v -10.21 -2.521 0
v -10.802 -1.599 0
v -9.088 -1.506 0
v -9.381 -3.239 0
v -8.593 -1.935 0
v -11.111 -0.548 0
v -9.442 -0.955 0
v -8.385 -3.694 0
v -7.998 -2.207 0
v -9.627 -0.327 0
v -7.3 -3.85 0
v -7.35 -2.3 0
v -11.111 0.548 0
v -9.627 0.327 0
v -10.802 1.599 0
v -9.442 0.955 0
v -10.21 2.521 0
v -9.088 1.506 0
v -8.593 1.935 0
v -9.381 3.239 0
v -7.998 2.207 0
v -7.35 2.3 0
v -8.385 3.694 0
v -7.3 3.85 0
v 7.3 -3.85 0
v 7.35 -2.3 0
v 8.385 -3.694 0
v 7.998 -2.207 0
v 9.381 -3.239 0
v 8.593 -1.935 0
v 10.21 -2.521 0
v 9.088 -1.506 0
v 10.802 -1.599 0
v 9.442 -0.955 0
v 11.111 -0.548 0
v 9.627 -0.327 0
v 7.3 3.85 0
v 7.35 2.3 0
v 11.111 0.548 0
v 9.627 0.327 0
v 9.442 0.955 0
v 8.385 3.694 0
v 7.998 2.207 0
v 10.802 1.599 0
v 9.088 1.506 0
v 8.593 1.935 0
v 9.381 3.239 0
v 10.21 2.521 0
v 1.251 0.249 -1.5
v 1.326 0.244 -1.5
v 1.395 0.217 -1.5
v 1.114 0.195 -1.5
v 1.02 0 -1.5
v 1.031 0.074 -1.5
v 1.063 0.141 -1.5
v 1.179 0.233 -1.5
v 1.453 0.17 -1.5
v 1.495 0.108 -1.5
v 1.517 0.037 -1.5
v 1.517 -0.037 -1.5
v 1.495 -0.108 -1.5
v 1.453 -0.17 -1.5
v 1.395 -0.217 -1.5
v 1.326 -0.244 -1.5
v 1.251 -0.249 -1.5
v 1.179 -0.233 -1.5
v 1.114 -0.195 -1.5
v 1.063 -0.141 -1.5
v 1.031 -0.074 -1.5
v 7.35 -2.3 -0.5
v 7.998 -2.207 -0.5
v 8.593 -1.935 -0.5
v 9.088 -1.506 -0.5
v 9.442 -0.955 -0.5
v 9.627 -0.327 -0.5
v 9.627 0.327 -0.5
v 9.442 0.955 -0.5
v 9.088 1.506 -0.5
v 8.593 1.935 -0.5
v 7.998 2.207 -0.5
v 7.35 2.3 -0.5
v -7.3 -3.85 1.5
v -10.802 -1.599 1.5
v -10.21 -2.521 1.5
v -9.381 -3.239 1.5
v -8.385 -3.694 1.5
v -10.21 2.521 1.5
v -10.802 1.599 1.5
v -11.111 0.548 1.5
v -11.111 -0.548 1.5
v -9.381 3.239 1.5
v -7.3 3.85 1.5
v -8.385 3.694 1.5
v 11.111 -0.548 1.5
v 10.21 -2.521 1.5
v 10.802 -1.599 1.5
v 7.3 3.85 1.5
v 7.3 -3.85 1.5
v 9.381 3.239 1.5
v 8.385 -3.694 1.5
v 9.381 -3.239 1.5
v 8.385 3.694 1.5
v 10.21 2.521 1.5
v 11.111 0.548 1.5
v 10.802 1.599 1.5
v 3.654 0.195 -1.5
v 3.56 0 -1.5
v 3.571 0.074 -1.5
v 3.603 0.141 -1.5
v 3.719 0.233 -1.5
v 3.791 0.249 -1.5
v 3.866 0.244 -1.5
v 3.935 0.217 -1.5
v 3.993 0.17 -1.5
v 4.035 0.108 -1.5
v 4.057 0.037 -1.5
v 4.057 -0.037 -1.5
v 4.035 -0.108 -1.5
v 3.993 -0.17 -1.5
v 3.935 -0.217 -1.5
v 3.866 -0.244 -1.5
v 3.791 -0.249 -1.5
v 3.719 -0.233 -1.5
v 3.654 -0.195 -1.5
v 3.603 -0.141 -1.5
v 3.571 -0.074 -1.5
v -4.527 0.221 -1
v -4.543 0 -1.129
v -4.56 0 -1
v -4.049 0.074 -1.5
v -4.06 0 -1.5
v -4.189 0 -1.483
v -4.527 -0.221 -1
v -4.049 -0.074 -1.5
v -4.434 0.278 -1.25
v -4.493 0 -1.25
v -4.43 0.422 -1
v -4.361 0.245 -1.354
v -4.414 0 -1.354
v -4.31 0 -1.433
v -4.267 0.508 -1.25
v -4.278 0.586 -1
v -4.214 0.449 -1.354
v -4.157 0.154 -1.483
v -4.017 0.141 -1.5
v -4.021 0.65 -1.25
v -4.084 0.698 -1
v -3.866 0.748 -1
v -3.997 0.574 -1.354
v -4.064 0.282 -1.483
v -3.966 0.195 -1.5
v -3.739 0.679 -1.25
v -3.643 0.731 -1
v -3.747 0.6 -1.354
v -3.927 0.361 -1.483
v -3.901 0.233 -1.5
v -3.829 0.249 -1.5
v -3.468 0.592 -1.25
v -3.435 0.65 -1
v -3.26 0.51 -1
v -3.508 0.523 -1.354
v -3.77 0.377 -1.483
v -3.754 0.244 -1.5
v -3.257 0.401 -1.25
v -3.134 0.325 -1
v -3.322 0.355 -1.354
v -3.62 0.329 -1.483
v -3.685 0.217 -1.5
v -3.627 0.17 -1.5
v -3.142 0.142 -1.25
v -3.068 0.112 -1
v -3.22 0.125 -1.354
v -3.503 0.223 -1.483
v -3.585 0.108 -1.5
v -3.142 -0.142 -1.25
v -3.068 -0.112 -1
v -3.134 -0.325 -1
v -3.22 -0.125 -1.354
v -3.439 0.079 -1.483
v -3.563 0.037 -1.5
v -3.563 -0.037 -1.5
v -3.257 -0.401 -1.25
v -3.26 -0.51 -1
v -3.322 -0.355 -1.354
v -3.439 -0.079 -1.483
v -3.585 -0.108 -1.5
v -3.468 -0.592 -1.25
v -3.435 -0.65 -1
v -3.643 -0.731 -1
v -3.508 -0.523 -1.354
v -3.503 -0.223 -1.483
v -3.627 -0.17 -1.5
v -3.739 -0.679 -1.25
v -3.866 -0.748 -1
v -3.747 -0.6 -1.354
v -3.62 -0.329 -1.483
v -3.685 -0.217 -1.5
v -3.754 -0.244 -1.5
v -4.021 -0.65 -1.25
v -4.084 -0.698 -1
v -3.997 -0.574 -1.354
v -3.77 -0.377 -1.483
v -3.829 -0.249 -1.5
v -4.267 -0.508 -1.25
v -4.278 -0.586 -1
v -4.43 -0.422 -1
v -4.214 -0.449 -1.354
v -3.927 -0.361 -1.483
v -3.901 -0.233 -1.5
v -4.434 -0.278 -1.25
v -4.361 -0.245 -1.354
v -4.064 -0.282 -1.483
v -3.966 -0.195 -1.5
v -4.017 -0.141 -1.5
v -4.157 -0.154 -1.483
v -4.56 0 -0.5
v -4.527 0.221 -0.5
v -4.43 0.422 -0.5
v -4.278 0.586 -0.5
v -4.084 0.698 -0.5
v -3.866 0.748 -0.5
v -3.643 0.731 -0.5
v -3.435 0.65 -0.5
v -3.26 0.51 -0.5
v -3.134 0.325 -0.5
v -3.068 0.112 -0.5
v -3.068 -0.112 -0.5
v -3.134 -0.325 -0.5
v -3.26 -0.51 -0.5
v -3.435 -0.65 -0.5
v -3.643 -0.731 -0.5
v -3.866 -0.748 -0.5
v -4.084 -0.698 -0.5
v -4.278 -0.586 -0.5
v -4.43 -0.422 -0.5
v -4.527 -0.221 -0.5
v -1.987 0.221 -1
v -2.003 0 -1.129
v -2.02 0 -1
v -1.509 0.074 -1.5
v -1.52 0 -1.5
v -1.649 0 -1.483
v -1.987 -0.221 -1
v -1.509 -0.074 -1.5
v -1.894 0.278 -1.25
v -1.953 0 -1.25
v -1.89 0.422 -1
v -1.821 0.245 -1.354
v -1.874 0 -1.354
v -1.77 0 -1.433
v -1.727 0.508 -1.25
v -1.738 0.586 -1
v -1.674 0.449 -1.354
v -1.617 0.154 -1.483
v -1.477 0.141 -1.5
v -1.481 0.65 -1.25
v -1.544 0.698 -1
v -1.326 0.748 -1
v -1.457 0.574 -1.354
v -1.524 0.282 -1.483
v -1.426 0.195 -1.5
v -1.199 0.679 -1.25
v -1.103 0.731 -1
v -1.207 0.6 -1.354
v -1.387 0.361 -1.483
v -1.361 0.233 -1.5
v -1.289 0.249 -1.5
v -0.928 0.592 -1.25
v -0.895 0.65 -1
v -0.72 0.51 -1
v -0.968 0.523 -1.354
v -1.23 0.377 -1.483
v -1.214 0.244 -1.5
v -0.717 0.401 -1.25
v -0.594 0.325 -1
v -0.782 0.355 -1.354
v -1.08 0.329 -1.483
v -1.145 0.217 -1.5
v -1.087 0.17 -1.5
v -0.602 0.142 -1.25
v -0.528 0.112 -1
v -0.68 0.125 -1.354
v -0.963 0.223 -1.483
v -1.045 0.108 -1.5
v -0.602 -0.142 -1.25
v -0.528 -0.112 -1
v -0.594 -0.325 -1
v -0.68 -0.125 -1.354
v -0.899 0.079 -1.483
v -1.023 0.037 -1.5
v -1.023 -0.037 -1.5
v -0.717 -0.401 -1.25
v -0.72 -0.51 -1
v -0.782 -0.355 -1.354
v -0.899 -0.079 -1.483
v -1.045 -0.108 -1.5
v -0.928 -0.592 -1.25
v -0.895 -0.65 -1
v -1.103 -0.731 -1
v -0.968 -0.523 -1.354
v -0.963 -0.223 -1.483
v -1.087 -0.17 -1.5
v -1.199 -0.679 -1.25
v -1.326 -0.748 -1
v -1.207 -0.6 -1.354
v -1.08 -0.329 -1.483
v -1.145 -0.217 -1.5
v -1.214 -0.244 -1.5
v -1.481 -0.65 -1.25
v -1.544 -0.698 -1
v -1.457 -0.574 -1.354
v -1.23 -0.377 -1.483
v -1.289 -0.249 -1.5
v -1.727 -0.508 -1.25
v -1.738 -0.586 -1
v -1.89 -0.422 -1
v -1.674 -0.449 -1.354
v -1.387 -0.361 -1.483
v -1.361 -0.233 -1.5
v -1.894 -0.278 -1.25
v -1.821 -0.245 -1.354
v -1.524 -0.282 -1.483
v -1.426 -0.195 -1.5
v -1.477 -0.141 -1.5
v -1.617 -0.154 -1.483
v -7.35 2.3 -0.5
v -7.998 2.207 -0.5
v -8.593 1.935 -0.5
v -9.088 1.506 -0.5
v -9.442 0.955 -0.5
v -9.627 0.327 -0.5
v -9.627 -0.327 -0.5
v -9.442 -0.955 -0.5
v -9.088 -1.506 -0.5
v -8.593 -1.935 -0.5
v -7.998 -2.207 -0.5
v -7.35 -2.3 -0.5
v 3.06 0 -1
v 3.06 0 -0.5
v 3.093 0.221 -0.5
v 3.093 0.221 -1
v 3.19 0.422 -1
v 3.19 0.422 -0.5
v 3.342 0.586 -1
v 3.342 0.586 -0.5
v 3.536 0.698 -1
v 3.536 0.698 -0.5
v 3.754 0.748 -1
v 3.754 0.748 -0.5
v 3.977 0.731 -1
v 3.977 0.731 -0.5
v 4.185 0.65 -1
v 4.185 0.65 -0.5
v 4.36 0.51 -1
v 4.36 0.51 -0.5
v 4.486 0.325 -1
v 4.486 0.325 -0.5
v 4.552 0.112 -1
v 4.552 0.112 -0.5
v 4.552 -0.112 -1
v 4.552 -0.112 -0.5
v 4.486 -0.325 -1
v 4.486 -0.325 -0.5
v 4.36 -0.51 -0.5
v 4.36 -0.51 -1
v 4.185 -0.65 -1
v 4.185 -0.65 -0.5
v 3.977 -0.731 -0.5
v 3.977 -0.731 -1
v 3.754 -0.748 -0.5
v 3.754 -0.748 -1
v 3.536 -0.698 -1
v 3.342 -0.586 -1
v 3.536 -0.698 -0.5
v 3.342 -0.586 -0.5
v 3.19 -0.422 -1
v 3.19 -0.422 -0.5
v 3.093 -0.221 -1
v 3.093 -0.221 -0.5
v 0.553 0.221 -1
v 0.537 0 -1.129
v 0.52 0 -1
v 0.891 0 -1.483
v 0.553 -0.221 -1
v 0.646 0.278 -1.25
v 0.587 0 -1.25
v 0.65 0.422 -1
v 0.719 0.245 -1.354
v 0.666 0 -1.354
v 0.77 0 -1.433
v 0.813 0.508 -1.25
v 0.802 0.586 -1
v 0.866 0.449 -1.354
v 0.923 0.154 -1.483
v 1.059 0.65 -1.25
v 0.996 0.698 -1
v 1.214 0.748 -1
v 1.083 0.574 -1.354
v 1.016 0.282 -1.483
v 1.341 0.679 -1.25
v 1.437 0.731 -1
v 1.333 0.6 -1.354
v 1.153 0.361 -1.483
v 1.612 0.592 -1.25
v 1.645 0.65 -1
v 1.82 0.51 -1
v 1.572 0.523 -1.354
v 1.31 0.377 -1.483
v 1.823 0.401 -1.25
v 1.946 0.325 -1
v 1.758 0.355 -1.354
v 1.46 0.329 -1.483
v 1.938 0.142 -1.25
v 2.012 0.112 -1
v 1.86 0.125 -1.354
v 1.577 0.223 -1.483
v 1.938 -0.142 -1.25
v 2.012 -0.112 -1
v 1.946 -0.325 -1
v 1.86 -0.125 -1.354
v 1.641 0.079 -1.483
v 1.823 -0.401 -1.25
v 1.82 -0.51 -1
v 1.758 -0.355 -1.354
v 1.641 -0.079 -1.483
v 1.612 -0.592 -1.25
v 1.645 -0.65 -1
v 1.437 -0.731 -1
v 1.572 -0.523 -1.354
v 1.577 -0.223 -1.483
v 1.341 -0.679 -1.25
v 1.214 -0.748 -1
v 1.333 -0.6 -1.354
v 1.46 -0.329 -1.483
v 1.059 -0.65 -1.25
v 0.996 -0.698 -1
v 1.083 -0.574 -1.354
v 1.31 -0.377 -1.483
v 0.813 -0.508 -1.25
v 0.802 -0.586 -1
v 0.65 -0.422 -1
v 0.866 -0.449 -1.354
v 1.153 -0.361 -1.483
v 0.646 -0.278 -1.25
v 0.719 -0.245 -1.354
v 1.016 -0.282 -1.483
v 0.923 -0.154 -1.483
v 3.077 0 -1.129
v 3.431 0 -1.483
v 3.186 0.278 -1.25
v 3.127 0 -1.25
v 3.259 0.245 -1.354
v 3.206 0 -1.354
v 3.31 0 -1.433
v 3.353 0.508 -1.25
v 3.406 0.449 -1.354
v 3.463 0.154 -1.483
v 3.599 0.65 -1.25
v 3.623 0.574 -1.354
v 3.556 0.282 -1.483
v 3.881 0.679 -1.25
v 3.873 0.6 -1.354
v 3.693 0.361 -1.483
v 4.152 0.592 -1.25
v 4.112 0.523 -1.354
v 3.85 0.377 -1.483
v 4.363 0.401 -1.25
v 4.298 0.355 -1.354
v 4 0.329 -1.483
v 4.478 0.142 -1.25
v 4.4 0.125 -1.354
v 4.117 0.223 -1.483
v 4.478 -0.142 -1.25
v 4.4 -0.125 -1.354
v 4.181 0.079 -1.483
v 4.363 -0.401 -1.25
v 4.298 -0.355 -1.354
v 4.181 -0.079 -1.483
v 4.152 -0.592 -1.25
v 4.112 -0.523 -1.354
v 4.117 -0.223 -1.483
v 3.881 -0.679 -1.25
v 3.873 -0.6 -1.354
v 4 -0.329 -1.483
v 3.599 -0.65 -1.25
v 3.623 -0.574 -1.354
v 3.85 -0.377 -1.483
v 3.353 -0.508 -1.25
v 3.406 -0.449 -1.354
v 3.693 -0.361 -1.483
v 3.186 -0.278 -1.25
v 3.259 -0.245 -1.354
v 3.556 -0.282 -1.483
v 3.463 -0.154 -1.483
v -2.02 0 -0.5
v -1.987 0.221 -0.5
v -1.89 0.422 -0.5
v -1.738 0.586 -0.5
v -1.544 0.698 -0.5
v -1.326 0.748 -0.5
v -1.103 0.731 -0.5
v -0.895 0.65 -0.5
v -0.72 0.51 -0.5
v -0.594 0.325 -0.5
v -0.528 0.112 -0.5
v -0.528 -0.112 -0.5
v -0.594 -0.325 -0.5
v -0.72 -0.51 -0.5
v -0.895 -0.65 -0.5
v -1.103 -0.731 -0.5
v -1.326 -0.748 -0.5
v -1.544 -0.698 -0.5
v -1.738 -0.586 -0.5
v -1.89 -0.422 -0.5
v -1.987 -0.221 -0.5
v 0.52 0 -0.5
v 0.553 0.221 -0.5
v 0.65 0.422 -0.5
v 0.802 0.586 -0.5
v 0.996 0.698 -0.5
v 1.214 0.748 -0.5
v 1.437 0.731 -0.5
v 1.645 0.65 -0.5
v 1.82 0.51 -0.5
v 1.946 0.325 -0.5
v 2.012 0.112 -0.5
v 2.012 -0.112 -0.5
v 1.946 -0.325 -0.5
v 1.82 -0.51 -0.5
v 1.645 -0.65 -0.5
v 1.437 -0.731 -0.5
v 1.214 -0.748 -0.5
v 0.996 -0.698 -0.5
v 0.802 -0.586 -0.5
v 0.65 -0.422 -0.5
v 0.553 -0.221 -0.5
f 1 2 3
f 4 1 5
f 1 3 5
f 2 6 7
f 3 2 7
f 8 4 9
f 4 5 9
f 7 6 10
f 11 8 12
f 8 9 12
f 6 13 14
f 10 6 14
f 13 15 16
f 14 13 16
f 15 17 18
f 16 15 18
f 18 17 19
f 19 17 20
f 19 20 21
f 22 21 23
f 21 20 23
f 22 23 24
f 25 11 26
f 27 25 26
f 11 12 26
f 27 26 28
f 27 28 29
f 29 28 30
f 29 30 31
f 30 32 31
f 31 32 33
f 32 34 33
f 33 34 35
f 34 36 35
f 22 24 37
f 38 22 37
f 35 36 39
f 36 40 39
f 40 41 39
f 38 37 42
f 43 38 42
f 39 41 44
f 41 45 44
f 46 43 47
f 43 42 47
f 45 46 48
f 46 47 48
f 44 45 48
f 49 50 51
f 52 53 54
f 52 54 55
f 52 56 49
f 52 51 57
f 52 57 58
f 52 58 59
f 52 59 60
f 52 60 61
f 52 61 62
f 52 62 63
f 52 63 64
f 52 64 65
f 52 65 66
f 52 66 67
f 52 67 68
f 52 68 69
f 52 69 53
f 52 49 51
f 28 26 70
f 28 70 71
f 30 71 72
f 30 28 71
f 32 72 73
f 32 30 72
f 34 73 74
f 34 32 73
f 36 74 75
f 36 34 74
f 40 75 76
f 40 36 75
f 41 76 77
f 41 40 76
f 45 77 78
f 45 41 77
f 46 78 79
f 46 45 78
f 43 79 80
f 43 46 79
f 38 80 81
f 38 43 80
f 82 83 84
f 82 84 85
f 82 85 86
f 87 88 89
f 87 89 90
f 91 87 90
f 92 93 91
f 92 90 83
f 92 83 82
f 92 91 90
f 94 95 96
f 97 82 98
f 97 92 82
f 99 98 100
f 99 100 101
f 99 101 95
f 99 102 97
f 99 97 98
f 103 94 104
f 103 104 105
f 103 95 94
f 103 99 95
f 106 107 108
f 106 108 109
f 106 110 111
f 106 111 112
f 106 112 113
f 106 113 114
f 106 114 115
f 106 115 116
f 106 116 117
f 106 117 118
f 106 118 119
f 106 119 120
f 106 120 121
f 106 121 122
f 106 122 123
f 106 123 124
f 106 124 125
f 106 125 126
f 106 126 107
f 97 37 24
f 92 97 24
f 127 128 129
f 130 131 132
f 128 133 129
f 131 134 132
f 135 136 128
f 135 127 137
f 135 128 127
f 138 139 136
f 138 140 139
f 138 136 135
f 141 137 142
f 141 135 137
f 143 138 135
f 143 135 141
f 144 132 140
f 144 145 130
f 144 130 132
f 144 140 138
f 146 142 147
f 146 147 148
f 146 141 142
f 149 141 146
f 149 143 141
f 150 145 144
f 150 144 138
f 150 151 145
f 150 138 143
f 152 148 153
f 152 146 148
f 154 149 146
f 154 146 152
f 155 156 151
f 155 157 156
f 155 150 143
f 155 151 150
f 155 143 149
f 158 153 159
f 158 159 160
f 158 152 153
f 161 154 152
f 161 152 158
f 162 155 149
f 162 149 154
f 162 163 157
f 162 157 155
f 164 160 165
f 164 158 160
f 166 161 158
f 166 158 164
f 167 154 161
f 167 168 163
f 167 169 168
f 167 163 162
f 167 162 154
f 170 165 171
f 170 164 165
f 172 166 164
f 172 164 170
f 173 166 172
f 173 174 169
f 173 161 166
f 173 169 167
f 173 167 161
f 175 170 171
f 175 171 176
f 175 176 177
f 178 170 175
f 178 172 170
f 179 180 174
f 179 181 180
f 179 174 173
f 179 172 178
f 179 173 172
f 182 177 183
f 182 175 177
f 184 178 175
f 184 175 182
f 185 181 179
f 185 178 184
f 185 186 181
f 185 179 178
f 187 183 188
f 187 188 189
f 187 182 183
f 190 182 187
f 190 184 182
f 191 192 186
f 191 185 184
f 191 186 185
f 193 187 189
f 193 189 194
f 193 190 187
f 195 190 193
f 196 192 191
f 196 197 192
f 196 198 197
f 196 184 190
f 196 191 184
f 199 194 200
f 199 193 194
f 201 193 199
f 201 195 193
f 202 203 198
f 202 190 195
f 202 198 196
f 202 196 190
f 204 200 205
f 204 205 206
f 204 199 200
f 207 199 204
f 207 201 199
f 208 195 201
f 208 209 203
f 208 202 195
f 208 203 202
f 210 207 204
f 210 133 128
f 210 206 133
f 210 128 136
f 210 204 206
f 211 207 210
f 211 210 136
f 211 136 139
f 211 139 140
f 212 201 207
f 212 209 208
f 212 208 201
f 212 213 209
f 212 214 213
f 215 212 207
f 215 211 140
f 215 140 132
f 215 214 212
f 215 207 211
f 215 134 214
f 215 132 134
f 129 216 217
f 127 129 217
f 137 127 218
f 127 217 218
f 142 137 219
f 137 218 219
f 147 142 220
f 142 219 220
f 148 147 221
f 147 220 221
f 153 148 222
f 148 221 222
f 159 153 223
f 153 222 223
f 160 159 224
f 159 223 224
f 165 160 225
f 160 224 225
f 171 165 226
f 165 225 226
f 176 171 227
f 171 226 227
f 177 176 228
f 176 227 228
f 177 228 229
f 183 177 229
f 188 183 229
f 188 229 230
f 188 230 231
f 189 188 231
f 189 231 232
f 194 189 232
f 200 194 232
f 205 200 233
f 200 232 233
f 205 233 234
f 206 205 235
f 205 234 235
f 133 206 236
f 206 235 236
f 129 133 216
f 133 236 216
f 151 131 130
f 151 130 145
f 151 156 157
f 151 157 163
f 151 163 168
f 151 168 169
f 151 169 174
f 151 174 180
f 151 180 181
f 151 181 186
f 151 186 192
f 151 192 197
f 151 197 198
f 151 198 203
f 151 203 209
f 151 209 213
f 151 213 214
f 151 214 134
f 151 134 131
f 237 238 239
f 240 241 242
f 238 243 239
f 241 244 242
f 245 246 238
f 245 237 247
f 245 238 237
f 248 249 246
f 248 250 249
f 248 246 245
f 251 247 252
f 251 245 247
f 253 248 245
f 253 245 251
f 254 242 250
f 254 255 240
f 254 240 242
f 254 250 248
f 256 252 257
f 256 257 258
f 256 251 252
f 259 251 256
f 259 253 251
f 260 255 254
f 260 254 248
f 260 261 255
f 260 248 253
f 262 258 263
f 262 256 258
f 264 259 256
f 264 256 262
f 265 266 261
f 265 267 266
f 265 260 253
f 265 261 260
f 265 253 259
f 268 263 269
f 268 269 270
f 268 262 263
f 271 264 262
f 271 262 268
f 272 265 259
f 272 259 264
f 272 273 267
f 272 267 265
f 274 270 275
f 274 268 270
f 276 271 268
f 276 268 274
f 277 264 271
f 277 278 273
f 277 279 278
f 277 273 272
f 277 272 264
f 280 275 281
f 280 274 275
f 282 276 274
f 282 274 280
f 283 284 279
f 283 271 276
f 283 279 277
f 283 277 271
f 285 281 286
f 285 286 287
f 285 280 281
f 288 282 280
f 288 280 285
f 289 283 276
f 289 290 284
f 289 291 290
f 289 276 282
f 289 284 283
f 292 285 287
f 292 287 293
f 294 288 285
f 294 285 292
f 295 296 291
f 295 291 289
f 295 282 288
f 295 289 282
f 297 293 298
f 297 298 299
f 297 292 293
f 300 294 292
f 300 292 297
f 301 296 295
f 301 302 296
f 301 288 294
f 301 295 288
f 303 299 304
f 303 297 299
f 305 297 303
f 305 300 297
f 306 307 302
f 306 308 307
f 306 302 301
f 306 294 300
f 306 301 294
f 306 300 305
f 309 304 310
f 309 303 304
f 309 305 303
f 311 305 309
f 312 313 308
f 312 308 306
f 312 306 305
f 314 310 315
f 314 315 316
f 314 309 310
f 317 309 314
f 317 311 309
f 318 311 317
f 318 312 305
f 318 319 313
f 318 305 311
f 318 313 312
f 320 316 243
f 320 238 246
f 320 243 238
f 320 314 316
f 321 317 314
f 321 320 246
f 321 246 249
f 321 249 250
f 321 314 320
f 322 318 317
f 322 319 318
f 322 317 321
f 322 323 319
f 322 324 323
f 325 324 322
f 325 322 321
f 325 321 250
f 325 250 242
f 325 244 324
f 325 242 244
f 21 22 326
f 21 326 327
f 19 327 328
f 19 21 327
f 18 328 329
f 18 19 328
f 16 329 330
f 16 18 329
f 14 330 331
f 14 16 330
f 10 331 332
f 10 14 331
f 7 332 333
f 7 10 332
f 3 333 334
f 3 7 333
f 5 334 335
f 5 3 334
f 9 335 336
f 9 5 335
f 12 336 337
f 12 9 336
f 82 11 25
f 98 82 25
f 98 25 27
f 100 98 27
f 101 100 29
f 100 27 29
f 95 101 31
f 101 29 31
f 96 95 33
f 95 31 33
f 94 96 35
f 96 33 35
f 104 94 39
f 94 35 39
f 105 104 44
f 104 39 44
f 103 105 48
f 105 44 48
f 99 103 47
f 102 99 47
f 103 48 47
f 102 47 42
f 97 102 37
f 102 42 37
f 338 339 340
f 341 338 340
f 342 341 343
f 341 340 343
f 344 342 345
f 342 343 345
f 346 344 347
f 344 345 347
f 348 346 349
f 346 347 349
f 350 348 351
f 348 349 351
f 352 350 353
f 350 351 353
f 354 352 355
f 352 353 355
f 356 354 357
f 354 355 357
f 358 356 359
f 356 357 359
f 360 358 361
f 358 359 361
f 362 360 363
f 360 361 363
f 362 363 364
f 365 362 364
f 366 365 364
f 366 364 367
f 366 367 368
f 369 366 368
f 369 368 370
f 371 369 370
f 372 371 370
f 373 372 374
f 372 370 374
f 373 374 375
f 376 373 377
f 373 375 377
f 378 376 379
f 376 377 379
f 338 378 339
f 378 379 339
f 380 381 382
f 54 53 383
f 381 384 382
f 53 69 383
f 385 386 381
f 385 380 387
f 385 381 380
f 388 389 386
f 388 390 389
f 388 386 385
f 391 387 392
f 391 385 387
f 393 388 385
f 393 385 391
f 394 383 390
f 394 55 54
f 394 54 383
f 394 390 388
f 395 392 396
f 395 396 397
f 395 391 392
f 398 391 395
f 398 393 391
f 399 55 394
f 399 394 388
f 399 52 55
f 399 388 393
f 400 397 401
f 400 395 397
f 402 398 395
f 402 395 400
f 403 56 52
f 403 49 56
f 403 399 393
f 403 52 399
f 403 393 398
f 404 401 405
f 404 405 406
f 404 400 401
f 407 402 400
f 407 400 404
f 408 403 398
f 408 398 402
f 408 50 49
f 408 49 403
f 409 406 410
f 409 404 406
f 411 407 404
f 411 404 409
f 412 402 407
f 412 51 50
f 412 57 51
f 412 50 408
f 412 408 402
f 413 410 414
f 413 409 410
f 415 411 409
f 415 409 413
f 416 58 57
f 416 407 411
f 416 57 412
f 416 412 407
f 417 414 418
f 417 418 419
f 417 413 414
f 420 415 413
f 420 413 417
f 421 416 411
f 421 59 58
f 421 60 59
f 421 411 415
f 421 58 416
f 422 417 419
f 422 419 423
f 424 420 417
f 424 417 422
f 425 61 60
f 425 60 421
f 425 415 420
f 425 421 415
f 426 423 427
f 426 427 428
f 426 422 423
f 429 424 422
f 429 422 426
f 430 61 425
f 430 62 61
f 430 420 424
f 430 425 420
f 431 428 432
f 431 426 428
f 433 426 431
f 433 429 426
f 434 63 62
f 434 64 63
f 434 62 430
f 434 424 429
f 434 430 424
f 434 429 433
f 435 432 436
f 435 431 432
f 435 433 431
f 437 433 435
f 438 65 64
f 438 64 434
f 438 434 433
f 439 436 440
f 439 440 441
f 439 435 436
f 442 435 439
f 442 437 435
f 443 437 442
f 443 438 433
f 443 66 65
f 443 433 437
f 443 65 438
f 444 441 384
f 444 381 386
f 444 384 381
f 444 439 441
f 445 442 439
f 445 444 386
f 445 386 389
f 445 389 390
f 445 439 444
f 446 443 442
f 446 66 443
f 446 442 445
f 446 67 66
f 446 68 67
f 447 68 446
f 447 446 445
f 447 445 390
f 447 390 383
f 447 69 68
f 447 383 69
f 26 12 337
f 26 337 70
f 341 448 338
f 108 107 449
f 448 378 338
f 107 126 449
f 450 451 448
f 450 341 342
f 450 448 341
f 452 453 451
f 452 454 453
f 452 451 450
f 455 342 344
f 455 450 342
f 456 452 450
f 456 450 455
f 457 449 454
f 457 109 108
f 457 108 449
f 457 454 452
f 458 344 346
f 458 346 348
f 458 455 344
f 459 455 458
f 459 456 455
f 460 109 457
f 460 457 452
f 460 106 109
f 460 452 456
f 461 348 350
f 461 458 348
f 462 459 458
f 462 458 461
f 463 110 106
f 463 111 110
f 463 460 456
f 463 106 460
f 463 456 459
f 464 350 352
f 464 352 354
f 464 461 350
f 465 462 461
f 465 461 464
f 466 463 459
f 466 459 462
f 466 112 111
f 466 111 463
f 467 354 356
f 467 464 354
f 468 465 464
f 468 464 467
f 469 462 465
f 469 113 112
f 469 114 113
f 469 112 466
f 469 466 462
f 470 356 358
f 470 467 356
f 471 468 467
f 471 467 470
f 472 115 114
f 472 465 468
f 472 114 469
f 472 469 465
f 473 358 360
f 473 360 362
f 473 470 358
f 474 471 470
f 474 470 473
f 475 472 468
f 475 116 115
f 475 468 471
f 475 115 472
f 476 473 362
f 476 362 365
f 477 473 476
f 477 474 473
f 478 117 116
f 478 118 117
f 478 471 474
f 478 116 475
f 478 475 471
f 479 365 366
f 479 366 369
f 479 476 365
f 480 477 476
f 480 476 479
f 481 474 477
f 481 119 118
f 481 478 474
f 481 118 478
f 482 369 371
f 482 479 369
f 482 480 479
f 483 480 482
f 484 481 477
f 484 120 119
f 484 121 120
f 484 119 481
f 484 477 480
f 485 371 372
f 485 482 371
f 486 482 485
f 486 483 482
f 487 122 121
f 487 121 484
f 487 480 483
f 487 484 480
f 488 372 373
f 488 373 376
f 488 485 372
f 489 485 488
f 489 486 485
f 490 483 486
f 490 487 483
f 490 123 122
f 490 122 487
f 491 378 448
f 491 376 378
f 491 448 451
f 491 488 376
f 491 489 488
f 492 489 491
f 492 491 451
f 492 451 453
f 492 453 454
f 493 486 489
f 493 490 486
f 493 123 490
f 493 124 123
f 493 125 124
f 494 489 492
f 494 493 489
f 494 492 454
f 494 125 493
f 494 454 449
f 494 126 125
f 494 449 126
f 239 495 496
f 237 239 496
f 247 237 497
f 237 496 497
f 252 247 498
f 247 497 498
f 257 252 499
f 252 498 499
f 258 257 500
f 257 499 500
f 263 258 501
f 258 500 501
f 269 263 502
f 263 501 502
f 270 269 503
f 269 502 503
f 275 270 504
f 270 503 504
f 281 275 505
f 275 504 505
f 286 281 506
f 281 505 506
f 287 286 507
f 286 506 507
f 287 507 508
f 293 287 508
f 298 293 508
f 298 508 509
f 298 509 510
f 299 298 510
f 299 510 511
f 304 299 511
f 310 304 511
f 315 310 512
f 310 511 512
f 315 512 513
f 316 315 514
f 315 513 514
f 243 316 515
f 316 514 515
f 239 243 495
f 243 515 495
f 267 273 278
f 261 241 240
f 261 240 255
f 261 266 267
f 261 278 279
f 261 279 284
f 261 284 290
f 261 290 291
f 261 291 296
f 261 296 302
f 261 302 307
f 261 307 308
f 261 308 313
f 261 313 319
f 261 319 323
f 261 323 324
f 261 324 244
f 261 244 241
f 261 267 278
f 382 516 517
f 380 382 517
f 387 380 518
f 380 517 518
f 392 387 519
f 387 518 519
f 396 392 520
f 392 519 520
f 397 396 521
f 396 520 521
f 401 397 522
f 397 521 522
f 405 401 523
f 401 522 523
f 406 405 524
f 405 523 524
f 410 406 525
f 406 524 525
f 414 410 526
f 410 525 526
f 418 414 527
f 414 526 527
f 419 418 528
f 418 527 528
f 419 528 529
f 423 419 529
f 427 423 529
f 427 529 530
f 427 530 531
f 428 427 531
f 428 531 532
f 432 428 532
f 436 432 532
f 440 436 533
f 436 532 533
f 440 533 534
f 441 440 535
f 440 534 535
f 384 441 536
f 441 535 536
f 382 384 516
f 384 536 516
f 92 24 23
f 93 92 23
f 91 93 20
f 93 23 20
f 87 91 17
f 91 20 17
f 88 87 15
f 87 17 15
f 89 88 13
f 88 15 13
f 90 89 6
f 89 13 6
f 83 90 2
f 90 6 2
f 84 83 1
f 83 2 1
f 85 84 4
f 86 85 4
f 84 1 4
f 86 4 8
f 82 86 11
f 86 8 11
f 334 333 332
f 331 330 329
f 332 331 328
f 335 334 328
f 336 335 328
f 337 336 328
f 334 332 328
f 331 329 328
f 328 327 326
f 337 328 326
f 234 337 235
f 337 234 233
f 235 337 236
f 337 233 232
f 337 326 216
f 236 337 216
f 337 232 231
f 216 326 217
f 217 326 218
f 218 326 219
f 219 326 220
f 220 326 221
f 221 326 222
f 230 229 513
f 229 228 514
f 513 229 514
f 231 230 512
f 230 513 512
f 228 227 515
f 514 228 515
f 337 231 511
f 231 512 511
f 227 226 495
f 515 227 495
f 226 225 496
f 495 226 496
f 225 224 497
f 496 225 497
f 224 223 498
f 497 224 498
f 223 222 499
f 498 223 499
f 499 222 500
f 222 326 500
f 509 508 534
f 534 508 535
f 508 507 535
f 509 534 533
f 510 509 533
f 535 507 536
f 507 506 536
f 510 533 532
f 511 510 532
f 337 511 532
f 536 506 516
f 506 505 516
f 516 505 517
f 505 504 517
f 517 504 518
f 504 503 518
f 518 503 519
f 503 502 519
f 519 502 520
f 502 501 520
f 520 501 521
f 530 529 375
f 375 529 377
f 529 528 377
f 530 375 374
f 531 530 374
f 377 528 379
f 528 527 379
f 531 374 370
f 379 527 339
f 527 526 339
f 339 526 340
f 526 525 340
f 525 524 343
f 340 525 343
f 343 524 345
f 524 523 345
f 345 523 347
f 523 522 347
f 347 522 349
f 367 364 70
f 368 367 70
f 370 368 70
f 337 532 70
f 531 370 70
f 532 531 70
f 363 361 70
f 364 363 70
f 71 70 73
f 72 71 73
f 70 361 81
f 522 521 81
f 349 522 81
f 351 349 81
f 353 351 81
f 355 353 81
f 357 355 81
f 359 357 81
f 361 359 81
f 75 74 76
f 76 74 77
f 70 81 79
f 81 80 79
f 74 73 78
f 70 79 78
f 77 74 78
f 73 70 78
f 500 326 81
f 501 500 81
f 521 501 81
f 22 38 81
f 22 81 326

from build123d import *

# Parameters (mm, degrees)
EXTRUDE_1_DEPTH = 1.5
EXTRUDE_2_DEPTH = 0.5
SKETCH_3_R      = 0.75
EXTRUDE_3_DEPTH = 1
FILLET_2_R      = 0.5


with BuildPart() as part:
    # 草图1 → 凸台-拉伸1 (new body)
    with BuildSketch(Plane.XY):
        with BuildLine():
            Line((7.3, 3.85), (-7.3, 3.85))
            ThreePointArc((-7.3, 3.85), (-11.15, 0), (-7.3, -3.85))
            Line((-7.3, -3.85), (7.3, -3.85))
            ThreePointArc((7.3, -3.85), (11.15, 0), (7.3, 3.85))
        make_face()
    extrude(amount=EXTRUDE_1_DEPTH)

    # 草图2 → 凸台-拉伸2 (add)
    with BuildSketch(Plane(origin=(0, 0, 0), x_dir=(-1, 0, 0), z_dir=(0, 0, -1))):
        with BuildLine():
            Line((-7.35, 2.3), (7.35, 2.3))
            ThreePointArc((7.35, 2.3), (9.65, 0), (7.35, -2.3))
            Line((7.35, -2.3), (-7.35, -2.3))
            ThreePointArc((-7.35, -2.3), (-9.65, 0), (-7.35, 2.3))
        make_face()
    extrude(amount=EXTRUDE_2_DEPTH)

    # 草图3 → 凸台-拉伸3 (add)
    with BuildSketch(Plane(origin=(0, 0, -0.5), x_dir=(-1, 0, 0), z_dir=(0, 0, -1))):
        with Locations((1.27, 0)):
            Circle(SKETCH_3_R)
        with Locations((3.81, 0)):
            Circle(SKETCH_3_R)
        with Locations((-3.81, 0)):
            Circle(SKETCH_3_R)
        with Locations((-1.27, 0)):
            Circle(SKETCH_3_R)
    extrude(amount=EXTRUDE_3_DEPTH)

    # 圆角2
    fillet_2_edges = [part.edges().sort_by_distance(p)[0] for p in [
        (-0.52, 0, -1.5),
        (-3.06, 0, -1.5),
        (4.56, 0, -1.5),
        (2.02, 0, -1.5),
    ]]
    fillet(fillet_2_edges, radius=FILLET_2_R)


solid = part.part
